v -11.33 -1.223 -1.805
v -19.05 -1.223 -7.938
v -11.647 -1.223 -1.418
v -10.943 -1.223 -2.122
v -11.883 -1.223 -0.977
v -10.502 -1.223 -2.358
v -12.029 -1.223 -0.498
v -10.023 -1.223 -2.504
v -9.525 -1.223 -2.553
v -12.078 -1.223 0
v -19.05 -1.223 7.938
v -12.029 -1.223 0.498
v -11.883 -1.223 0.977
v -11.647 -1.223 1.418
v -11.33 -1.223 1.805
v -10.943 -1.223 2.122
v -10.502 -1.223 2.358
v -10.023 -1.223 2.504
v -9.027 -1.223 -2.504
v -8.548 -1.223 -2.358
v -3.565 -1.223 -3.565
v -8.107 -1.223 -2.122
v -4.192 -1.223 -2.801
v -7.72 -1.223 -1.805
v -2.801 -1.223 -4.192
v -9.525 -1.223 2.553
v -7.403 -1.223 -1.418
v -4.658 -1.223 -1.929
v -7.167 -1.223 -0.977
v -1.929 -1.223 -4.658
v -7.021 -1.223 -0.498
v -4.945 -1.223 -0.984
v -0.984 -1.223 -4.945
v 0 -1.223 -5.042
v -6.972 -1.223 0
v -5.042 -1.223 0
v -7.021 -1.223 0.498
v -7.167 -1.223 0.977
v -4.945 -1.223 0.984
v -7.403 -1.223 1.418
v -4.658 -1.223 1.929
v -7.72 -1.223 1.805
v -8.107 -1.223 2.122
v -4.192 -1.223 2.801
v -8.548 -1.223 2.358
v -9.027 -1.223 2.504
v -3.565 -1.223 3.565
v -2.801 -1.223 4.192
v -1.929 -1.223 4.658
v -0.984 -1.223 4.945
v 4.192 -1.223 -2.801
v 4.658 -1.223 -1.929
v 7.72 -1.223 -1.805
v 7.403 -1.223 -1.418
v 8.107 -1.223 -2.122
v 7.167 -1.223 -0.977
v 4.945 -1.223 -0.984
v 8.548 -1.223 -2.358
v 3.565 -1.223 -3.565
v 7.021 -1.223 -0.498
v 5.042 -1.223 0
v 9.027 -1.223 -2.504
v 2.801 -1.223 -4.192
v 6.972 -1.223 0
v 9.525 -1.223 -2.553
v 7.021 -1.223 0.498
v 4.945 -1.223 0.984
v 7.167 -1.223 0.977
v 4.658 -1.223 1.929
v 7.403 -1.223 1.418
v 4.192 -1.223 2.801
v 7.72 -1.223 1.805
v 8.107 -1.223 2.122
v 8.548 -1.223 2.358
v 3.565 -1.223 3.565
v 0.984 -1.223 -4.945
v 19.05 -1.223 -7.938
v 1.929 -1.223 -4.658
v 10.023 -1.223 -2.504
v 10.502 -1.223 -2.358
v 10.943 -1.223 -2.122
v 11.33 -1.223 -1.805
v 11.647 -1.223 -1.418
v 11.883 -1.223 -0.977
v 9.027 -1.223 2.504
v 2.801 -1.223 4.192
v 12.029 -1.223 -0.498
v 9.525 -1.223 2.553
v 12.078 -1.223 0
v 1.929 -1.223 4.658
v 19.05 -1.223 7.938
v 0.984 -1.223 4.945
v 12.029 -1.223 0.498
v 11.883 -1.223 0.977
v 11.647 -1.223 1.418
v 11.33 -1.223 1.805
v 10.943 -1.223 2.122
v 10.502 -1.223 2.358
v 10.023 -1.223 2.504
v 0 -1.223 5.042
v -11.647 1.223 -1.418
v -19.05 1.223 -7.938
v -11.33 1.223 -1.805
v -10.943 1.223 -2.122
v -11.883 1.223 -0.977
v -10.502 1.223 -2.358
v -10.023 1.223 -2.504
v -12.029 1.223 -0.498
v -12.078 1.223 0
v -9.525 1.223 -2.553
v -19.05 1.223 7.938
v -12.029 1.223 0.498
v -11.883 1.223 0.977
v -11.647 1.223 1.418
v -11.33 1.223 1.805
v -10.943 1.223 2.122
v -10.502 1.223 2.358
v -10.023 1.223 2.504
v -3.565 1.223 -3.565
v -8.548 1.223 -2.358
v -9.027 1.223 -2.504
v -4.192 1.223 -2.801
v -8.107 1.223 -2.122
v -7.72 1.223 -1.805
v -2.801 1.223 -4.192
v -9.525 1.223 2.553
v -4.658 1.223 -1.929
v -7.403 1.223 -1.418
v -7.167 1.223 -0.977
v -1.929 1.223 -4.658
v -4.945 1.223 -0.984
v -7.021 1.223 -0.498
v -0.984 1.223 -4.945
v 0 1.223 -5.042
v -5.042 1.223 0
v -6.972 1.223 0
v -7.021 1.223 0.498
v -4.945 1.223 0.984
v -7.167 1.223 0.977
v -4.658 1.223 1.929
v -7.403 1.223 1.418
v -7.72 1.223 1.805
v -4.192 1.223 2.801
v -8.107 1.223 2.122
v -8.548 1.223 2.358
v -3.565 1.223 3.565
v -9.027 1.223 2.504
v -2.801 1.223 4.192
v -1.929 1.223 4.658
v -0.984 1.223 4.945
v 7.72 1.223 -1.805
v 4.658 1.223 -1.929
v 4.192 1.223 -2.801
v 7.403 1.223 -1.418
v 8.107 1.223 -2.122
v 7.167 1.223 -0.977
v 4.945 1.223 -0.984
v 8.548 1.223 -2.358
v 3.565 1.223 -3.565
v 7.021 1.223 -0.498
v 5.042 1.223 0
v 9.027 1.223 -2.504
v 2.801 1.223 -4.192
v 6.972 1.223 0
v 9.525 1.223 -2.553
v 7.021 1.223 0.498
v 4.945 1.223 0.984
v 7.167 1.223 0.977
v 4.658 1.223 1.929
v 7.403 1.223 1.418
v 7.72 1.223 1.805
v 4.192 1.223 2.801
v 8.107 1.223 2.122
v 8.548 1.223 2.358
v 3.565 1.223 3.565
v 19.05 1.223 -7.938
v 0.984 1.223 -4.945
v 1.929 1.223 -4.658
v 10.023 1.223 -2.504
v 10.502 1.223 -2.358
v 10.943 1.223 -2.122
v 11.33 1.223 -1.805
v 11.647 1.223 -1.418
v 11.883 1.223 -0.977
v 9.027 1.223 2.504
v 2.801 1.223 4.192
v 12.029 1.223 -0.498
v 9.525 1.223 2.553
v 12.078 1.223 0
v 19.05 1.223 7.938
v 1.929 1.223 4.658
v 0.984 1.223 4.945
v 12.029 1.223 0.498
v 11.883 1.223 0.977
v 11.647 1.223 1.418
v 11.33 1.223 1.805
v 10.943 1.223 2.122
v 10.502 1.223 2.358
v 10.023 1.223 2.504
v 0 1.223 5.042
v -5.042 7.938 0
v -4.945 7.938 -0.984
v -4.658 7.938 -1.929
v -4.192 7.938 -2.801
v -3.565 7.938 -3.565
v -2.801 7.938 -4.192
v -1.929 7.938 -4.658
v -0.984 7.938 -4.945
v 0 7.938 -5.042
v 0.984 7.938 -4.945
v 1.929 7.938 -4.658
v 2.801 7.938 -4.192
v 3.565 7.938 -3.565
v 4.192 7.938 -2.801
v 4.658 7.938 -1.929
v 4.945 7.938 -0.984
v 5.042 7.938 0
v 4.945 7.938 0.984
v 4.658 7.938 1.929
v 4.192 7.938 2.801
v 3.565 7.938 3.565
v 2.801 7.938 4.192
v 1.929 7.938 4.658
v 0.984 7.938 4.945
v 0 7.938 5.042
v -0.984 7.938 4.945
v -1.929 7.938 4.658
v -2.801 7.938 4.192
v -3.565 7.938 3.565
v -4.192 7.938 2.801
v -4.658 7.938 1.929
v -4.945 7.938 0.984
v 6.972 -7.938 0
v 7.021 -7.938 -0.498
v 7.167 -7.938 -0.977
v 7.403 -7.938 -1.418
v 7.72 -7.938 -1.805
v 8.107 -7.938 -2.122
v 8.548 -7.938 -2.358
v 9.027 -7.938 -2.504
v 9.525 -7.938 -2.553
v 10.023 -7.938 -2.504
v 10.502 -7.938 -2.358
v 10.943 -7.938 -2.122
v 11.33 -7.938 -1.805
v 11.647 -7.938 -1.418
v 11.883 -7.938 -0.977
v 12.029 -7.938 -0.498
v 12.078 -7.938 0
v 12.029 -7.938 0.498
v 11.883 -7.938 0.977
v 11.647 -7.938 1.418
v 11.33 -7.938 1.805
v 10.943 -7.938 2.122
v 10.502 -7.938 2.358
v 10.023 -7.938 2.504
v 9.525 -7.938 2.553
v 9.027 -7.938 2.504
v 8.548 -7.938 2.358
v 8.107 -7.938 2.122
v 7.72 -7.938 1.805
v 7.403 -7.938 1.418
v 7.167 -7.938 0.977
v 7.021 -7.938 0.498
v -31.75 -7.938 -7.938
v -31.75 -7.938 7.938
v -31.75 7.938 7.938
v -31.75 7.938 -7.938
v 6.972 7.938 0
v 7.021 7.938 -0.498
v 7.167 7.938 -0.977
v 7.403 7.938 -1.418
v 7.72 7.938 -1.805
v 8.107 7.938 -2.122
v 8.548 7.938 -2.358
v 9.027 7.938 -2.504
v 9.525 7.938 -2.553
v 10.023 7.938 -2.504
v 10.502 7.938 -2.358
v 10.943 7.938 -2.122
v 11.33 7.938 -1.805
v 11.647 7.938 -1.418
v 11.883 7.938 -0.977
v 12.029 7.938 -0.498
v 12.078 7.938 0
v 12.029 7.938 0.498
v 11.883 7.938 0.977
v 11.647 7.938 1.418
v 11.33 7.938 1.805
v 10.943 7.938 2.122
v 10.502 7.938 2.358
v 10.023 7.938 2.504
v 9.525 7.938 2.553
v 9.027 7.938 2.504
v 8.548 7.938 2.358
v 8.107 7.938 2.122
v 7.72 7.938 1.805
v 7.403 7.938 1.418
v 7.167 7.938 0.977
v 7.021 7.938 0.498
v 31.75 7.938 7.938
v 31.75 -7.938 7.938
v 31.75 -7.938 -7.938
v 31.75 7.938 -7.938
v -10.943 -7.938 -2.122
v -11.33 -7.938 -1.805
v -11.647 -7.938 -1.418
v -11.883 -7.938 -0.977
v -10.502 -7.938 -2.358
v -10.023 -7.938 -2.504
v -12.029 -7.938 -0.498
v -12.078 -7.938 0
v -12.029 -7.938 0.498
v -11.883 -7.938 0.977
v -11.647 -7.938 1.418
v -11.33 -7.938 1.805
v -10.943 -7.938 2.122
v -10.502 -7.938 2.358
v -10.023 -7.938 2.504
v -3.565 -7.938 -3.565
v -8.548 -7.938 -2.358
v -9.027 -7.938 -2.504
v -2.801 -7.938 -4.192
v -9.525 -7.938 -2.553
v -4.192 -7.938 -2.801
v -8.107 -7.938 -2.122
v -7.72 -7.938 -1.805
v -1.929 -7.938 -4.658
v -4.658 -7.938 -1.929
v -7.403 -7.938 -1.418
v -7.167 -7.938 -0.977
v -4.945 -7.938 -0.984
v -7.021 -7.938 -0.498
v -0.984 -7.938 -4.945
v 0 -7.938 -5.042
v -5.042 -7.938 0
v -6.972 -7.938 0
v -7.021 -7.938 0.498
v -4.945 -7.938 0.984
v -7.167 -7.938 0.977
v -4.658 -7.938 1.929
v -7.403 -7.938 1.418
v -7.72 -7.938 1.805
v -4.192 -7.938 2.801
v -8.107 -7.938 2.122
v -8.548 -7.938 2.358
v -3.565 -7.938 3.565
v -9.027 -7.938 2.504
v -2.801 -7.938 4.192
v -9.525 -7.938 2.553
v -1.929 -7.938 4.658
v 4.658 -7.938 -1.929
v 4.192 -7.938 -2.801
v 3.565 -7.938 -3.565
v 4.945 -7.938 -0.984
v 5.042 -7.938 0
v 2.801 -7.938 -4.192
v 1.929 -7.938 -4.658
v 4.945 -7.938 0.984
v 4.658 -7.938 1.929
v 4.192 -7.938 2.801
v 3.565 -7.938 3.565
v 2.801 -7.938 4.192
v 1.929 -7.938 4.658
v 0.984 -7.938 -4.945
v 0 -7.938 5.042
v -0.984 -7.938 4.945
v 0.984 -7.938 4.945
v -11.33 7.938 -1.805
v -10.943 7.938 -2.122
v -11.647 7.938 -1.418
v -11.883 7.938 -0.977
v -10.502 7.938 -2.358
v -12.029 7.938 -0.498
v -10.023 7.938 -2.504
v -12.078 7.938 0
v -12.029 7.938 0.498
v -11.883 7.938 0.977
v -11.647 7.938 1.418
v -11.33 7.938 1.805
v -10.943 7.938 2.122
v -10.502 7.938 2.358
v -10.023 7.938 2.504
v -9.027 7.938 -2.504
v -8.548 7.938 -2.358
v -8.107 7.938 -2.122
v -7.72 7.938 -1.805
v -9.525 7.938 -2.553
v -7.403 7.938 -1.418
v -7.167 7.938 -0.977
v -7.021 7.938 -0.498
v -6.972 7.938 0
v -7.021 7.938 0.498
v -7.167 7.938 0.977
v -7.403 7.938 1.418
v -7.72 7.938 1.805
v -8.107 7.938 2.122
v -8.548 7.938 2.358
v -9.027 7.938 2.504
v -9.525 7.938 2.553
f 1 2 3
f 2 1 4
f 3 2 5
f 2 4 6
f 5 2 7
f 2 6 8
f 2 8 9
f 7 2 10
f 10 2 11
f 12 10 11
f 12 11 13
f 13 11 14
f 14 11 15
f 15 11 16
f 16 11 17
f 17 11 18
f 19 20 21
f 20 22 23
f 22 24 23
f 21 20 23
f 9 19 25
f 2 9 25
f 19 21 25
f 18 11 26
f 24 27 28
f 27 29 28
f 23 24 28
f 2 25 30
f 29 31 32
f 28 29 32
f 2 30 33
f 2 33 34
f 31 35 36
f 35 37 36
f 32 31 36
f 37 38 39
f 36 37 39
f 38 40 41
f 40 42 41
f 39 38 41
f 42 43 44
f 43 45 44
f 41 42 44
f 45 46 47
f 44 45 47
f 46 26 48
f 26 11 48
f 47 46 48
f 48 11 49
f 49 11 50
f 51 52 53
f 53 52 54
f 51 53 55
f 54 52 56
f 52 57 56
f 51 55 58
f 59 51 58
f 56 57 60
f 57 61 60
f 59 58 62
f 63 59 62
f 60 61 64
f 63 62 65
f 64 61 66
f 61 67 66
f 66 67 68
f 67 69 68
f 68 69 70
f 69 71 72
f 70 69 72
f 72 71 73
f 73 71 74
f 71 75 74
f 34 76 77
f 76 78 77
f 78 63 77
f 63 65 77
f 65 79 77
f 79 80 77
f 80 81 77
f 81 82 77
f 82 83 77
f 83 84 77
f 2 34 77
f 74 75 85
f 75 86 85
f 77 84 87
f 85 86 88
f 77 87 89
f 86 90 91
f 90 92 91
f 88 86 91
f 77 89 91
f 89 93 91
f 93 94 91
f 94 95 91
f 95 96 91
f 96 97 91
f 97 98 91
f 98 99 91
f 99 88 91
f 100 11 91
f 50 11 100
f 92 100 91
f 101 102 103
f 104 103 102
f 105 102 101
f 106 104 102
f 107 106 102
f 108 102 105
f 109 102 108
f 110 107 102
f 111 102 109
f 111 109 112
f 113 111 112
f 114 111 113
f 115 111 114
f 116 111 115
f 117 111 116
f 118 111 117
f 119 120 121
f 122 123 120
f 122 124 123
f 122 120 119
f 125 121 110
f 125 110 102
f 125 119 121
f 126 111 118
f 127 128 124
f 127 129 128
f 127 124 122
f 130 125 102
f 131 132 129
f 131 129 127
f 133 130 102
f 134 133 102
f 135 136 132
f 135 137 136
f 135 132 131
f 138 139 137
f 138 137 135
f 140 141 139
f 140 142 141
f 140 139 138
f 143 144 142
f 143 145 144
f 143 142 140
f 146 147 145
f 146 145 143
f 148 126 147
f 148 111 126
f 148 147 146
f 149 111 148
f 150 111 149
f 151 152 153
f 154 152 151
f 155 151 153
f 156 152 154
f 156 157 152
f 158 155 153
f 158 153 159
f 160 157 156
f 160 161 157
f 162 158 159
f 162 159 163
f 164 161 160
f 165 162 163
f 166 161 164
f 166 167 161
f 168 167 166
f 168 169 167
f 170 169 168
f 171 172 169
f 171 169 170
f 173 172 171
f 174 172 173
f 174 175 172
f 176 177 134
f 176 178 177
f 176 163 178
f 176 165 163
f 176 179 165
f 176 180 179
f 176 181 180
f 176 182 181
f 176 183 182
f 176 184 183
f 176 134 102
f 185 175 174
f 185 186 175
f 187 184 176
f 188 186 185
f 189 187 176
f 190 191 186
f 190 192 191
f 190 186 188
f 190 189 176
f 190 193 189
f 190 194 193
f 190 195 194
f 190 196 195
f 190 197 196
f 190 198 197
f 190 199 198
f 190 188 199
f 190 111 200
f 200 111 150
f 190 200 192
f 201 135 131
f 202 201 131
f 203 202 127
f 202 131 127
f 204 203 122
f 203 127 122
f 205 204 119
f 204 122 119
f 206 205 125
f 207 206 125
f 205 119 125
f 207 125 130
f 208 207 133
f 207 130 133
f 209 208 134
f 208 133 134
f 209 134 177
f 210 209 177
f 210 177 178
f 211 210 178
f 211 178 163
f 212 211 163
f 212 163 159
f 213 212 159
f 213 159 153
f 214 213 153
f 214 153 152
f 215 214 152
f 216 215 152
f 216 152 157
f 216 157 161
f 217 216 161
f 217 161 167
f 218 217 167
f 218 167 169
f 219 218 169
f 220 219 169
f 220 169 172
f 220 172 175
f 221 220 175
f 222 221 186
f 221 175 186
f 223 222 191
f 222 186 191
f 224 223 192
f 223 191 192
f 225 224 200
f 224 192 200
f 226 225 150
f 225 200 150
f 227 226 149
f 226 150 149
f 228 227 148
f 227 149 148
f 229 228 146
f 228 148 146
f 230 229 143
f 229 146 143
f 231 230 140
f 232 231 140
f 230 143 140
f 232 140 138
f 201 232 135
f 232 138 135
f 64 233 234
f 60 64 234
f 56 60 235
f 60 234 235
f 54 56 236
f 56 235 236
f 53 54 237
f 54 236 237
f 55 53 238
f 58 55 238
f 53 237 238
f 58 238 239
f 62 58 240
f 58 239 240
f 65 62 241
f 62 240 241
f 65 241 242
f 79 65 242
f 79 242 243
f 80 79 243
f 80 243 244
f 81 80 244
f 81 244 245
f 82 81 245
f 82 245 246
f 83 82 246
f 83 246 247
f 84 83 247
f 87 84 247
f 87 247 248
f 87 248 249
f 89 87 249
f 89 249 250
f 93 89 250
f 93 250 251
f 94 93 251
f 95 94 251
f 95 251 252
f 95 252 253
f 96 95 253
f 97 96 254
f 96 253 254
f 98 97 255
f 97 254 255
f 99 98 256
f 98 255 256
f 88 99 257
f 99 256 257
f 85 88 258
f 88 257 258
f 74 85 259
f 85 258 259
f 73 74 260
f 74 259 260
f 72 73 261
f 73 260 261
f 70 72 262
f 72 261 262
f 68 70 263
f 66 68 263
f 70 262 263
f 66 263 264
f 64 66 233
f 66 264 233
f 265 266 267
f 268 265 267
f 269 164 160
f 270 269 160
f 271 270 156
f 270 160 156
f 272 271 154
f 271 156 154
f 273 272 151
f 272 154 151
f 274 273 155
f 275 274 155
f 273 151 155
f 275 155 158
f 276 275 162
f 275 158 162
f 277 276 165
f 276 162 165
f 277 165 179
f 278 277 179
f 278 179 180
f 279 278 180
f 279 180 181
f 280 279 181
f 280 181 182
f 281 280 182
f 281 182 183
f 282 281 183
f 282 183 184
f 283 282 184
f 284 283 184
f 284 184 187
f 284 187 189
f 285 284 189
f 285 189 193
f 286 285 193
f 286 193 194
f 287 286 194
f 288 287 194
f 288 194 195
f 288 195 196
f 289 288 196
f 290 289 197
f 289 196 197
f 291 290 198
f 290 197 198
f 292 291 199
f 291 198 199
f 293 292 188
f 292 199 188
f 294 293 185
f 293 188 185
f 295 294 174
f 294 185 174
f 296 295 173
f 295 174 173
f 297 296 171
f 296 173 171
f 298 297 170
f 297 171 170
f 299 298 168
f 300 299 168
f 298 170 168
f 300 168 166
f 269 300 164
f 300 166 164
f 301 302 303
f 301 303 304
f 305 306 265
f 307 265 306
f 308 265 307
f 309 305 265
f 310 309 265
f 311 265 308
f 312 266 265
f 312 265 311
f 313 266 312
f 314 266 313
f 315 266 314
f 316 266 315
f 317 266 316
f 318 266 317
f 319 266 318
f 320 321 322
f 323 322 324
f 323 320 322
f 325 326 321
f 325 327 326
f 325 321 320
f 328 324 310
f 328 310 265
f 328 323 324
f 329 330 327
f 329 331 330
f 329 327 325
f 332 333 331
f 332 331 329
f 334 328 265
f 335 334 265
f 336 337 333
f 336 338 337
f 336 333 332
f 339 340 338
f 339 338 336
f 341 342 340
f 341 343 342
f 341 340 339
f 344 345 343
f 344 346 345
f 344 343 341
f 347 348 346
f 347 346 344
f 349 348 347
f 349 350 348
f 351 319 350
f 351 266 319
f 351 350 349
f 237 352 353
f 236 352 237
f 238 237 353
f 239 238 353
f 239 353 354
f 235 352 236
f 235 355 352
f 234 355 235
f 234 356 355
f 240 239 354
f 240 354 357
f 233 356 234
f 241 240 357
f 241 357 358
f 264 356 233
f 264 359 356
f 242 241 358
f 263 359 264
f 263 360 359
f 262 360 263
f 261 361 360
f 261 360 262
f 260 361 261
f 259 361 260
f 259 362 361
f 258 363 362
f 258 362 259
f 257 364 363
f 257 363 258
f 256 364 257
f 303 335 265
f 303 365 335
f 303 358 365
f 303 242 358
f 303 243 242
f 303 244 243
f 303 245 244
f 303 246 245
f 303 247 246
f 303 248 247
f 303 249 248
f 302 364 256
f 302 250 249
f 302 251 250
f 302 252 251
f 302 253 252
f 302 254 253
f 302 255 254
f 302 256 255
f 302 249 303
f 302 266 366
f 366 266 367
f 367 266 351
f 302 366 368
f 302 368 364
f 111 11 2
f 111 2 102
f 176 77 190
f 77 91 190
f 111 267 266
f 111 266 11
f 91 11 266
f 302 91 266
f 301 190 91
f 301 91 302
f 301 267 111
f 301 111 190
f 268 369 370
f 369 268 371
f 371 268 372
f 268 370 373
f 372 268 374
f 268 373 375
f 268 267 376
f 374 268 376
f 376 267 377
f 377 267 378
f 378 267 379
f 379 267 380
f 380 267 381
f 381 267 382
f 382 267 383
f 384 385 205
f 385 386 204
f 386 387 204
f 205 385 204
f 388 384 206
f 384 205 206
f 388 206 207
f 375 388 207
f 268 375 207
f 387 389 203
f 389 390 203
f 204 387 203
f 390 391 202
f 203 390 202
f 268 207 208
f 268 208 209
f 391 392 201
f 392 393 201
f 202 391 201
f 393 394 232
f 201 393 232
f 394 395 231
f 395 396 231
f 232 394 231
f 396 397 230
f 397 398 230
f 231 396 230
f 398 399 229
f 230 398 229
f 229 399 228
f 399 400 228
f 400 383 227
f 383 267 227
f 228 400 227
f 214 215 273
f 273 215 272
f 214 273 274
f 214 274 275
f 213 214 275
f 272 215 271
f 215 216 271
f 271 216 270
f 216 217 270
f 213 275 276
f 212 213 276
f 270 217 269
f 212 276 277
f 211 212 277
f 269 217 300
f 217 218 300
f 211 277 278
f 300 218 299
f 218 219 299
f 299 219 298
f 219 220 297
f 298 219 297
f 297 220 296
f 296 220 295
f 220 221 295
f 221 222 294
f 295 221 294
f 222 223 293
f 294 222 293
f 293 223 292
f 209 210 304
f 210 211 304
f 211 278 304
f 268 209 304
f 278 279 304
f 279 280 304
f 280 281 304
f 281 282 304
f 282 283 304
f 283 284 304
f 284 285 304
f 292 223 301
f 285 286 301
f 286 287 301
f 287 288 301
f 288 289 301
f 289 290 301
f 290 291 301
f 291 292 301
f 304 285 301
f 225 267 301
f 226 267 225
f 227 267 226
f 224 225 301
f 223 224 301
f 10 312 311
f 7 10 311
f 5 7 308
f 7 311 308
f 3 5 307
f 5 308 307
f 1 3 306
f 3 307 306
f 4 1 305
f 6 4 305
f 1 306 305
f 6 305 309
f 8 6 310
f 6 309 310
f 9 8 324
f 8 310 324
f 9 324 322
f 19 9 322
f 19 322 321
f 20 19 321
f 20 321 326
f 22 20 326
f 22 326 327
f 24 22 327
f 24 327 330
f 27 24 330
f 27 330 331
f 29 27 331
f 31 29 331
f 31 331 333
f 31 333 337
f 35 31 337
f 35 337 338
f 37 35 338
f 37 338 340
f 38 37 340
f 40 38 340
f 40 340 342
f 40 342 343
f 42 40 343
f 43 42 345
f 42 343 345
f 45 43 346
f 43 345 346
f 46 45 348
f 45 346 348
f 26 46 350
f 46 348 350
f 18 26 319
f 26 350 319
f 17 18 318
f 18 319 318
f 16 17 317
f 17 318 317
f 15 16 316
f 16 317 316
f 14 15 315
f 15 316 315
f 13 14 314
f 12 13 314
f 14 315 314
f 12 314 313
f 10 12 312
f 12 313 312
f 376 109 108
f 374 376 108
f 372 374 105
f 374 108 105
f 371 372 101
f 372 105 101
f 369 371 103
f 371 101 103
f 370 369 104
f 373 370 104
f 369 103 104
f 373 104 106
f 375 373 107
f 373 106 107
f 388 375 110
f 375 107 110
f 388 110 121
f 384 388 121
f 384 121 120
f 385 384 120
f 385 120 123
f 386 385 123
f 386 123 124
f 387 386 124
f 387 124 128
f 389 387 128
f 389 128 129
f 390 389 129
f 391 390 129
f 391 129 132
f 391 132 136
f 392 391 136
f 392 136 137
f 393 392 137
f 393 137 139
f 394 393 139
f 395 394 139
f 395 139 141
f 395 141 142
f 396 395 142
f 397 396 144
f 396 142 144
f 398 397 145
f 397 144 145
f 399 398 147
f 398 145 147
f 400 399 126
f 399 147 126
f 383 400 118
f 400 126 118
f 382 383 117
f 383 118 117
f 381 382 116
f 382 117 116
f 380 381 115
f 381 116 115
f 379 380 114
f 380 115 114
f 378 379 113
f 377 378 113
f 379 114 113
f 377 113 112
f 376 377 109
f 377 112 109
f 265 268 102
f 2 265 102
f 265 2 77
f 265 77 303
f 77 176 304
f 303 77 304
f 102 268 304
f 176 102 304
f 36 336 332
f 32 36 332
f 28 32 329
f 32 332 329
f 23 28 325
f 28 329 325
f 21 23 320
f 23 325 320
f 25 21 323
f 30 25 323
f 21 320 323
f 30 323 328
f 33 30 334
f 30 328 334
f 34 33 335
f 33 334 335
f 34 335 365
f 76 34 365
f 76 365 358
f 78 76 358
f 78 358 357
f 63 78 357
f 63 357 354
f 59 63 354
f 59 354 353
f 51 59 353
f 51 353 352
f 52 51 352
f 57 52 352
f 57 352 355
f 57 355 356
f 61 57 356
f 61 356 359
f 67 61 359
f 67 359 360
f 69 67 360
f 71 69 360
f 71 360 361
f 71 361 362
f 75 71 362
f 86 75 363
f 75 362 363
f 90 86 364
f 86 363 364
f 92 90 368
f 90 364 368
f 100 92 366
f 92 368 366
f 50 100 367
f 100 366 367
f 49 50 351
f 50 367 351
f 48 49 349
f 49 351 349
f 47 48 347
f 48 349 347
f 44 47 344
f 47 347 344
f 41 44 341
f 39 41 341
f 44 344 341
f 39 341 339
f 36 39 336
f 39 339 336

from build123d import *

# Parameters (mm, degrees)
SKETCH1_W               = 63.5
SKETCH1_H               = 15.875
SKETCH1_W_2             = 38.1
SKETCH1_H_2             = 2.446333072
BOSS_EXTRUDE1_DEPTH     = 7.9375
F_1_4_20_TAPPED_HOLE1_D = 5.1054
F_3_8_CLEARANCE_HOLE1_D = 10.0838


with BuildPart() as part:
    # Sketch1 → Boss-Extrude1 (new, symmetric)
    with BuildSketch(Plane.XY):
        Rectangle(SKETCH1_W, SKETCH1_H)
        Rectangle(SKETCH1_W_2, SKETCH1_H_2, mode=Mode.SUBTRACT)
    extrude(amount=BOSS_EXTRUDE1_DEPTH, both=True)

    # 1/4-20 Tapped Hole1 (through all)
    with Locations(Plane(origin=(0, 7.9375, 0), x_dir=(1, 0, 0), z_dir=(0, 1, 0))):
        with Locations((9.525, 0), (-9.525, 0)):
            Hole(F_1_4_20_TAPPED_HOLE1_D / 2)

    # 3/8 Clearance Hole1 (through all)
    with Locations(Plane(origin=(0, 7.9375, 0), x_dir=(1, 0, 0), z_dir=(0, 1, 0))):
        with Locations((0, 0)):
            Hole(F_3_8_CLEARANCE_HOLE1_D / 2)


solid = part.part
